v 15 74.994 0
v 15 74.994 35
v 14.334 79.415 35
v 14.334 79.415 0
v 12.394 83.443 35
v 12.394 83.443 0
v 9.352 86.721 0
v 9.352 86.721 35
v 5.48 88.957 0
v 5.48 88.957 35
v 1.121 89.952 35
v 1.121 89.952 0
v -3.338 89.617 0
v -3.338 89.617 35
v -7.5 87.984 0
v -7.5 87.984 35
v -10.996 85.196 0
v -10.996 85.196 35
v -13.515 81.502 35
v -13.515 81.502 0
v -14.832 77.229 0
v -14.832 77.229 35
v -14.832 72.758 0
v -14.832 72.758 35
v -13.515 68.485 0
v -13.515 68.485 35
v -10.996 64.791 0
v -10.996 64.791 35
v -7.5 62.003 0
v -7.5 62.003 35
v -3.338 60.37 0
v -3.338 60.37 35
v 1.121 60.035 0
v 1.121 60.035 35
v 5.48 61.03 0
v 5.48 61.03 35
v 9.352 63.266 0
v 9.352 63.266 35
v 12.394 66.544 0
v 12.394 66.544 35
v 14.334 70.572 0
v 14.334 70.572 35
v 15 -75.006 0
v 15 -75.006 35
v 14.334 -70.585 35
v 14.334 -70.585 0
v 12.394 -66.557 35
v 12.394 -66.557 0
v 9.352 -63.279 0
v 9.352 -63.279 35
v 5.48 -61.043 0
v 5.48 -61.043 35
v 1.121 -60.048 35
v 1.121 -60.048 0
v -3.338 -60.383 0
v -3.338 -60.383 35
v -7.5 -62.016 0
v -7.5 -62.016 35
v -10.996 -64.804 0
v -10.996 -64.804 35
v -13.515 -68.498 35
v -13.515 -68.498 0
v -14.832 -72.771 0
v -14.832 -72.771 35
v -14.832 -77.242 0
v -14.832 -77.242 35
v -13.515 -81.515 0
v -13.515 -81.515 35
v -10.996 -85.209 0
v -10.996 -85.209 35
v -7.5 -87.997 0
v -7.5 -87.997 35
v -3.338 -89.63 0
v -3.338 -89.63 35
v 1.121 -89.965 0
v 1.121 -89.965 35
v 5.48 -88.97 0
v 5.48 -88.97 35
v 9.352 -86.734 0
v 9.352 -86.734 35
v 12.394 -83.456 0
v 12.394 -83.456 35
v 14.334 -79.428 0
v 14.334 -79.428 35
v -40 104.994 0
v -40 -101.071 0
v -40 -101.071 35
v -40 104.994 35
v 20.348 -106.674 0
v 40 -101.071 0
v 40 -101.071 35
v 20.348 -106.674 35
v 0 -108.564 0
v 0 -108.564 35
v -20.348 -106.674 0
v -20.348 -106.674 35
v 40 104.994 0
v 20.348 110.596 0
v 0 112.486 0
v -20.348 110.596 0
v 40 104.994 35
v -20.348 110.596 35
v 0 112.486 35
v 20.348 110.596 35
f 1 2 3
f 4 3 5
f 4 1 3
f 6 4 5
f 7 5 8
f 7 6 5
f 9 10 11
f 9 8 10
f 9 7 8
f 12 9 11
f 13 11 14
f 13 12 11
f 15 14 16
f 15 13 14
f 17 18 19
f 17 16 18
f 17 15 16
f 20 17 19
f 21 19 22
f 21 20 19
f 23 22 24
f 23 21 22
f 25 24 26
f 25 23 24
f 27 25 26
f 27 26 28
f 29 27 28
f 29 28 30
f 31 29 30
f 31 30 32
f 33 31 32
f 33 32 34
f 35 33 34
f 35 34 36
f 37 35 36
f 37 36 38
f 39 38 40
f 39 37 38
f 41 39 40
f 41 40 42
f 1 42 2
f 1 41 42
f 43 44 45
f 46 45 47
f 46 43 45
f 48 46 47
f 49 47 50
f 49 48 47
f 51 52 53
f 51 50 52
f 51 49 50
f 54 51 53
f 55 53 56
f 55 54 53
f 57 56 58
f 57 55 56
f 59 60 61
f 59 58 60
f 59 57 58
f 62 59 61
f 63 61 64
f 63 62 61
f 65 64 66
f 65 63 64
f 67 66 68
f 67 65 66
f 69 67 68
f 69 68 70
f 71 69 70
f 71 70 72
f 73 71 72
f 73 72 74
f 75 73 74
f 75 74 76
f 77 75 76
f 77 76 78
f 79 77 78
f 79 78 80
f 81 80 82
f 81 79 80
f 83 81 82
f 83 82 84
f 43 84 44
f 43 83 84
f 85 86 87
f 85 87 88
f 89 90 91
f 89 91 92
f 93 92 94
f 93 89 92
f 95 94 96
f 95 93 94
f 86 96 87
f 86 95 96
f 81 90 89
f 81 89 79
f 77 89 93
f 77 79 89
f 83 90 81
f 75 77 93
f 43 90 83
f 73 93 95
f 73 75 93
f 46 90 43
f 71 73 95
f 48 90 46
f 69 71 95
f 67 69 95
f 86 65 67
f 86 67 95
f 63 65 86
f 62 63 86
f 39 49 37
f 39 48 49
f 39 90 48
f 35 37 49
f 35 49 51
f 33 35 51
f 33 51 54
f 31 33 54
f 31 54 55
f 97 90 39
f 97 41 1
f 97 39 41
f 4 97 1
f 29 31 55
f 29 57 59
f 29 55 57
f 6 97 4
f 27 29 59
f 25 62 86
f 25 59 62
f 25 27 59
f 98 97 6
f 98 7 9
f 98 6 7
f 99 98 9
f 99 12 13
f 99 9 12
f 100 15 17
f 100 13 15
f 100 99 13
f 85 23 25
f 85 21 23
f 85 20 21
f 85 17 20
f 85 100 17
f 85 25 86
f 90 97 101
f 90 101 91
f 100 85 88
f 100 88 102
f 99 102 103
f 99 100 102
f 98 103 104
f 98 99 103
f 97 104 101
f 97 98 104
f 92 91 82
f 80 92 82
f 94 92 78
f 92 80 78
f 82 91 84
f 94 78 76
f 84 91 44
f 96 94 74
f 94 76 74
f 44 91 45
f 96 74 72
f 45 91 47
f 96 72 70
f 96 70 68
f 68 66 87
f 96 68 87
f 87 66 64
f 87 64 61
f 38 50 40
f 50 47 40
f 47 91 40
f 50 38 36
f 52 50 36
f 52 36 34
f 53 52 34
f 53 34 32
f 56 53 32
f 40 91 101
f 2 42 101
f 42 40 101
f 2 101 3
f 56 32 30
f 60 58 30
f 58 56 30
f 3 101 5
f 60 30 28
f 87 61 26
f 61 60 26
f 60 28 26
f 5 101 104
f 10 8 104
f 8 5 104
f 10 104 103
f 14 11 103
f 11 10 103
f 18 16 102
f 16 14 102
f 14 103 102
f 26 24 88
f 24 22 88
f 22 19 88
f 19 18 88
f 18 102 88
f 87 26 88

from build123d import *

# Parameters (mm, degrees)
BOSS_EXTRUDE1_DEPTH     = 35
CUT_EXTRUDE1_DEPTH      = 125.410698055
CUT_EXTRUDE1_DEPTH_BACK = 125.410698055
SKETCH2_R               = 15
CUT_EXTRUDE2_DEPTH      = 125.410698055
CUT_EXTRUDE2_DEPTH_BACK = 125.410698055
SKETCH3_R               = 15


with BuildPart() as part:
    # Sketch1 → Boss-Extrude1 (new body)
    with BuildSketch(Plane.XY):
        with BuildLine():
            Line((-40, -101.071410351), (-40, 104.993508703))
            ThreePointArc((-40, 104.993508703), (0, 112.485651488), (40, 104.993508703))
            Line((40, 104.993508703), (40, -101.071410351))
            ThreePointArc((40, -101.071410351), (0, -108.563553136), (-40, -101.071410351))
        make_face()
    extrude(amount=BOSS_EXTRUDE1_DEPTH)

    # Sketch2 → Cut-Extrude1 (cut, two sides: drawn at the far end of the back side and taken through both)
    with BuildSketch(Plane.XY.offset(-CUT_EXTRUDE1_DEPTH_BACK)):
        with Locations((0, 74.993508703)):
            Circle(SKETCH2_R)
    extrude(amount=CUT_EXTRUDE1_DEPTH + CUT_EXTRUDE1_DEPTH_BACK, mode=Mode.SUBTRACT)

    # Sketch3 → Cut-Extrude2 (cut, two sides: drawn at the far end of the back side and taken through both)
    with BuildSketch(Plane.XY.offset(-CUT_EXTRUDE2_DEPTH_BACK)):
        with Locations((0, -75.006491297)):
            Circle(SKETCH3_R)
    extrude(amount=CUT_EXTRUDE2_DEPTH + CUT_EXTRUDE2_DEPTH_BACK, mode=Mode.SUBTRACT)


solid = part.part
